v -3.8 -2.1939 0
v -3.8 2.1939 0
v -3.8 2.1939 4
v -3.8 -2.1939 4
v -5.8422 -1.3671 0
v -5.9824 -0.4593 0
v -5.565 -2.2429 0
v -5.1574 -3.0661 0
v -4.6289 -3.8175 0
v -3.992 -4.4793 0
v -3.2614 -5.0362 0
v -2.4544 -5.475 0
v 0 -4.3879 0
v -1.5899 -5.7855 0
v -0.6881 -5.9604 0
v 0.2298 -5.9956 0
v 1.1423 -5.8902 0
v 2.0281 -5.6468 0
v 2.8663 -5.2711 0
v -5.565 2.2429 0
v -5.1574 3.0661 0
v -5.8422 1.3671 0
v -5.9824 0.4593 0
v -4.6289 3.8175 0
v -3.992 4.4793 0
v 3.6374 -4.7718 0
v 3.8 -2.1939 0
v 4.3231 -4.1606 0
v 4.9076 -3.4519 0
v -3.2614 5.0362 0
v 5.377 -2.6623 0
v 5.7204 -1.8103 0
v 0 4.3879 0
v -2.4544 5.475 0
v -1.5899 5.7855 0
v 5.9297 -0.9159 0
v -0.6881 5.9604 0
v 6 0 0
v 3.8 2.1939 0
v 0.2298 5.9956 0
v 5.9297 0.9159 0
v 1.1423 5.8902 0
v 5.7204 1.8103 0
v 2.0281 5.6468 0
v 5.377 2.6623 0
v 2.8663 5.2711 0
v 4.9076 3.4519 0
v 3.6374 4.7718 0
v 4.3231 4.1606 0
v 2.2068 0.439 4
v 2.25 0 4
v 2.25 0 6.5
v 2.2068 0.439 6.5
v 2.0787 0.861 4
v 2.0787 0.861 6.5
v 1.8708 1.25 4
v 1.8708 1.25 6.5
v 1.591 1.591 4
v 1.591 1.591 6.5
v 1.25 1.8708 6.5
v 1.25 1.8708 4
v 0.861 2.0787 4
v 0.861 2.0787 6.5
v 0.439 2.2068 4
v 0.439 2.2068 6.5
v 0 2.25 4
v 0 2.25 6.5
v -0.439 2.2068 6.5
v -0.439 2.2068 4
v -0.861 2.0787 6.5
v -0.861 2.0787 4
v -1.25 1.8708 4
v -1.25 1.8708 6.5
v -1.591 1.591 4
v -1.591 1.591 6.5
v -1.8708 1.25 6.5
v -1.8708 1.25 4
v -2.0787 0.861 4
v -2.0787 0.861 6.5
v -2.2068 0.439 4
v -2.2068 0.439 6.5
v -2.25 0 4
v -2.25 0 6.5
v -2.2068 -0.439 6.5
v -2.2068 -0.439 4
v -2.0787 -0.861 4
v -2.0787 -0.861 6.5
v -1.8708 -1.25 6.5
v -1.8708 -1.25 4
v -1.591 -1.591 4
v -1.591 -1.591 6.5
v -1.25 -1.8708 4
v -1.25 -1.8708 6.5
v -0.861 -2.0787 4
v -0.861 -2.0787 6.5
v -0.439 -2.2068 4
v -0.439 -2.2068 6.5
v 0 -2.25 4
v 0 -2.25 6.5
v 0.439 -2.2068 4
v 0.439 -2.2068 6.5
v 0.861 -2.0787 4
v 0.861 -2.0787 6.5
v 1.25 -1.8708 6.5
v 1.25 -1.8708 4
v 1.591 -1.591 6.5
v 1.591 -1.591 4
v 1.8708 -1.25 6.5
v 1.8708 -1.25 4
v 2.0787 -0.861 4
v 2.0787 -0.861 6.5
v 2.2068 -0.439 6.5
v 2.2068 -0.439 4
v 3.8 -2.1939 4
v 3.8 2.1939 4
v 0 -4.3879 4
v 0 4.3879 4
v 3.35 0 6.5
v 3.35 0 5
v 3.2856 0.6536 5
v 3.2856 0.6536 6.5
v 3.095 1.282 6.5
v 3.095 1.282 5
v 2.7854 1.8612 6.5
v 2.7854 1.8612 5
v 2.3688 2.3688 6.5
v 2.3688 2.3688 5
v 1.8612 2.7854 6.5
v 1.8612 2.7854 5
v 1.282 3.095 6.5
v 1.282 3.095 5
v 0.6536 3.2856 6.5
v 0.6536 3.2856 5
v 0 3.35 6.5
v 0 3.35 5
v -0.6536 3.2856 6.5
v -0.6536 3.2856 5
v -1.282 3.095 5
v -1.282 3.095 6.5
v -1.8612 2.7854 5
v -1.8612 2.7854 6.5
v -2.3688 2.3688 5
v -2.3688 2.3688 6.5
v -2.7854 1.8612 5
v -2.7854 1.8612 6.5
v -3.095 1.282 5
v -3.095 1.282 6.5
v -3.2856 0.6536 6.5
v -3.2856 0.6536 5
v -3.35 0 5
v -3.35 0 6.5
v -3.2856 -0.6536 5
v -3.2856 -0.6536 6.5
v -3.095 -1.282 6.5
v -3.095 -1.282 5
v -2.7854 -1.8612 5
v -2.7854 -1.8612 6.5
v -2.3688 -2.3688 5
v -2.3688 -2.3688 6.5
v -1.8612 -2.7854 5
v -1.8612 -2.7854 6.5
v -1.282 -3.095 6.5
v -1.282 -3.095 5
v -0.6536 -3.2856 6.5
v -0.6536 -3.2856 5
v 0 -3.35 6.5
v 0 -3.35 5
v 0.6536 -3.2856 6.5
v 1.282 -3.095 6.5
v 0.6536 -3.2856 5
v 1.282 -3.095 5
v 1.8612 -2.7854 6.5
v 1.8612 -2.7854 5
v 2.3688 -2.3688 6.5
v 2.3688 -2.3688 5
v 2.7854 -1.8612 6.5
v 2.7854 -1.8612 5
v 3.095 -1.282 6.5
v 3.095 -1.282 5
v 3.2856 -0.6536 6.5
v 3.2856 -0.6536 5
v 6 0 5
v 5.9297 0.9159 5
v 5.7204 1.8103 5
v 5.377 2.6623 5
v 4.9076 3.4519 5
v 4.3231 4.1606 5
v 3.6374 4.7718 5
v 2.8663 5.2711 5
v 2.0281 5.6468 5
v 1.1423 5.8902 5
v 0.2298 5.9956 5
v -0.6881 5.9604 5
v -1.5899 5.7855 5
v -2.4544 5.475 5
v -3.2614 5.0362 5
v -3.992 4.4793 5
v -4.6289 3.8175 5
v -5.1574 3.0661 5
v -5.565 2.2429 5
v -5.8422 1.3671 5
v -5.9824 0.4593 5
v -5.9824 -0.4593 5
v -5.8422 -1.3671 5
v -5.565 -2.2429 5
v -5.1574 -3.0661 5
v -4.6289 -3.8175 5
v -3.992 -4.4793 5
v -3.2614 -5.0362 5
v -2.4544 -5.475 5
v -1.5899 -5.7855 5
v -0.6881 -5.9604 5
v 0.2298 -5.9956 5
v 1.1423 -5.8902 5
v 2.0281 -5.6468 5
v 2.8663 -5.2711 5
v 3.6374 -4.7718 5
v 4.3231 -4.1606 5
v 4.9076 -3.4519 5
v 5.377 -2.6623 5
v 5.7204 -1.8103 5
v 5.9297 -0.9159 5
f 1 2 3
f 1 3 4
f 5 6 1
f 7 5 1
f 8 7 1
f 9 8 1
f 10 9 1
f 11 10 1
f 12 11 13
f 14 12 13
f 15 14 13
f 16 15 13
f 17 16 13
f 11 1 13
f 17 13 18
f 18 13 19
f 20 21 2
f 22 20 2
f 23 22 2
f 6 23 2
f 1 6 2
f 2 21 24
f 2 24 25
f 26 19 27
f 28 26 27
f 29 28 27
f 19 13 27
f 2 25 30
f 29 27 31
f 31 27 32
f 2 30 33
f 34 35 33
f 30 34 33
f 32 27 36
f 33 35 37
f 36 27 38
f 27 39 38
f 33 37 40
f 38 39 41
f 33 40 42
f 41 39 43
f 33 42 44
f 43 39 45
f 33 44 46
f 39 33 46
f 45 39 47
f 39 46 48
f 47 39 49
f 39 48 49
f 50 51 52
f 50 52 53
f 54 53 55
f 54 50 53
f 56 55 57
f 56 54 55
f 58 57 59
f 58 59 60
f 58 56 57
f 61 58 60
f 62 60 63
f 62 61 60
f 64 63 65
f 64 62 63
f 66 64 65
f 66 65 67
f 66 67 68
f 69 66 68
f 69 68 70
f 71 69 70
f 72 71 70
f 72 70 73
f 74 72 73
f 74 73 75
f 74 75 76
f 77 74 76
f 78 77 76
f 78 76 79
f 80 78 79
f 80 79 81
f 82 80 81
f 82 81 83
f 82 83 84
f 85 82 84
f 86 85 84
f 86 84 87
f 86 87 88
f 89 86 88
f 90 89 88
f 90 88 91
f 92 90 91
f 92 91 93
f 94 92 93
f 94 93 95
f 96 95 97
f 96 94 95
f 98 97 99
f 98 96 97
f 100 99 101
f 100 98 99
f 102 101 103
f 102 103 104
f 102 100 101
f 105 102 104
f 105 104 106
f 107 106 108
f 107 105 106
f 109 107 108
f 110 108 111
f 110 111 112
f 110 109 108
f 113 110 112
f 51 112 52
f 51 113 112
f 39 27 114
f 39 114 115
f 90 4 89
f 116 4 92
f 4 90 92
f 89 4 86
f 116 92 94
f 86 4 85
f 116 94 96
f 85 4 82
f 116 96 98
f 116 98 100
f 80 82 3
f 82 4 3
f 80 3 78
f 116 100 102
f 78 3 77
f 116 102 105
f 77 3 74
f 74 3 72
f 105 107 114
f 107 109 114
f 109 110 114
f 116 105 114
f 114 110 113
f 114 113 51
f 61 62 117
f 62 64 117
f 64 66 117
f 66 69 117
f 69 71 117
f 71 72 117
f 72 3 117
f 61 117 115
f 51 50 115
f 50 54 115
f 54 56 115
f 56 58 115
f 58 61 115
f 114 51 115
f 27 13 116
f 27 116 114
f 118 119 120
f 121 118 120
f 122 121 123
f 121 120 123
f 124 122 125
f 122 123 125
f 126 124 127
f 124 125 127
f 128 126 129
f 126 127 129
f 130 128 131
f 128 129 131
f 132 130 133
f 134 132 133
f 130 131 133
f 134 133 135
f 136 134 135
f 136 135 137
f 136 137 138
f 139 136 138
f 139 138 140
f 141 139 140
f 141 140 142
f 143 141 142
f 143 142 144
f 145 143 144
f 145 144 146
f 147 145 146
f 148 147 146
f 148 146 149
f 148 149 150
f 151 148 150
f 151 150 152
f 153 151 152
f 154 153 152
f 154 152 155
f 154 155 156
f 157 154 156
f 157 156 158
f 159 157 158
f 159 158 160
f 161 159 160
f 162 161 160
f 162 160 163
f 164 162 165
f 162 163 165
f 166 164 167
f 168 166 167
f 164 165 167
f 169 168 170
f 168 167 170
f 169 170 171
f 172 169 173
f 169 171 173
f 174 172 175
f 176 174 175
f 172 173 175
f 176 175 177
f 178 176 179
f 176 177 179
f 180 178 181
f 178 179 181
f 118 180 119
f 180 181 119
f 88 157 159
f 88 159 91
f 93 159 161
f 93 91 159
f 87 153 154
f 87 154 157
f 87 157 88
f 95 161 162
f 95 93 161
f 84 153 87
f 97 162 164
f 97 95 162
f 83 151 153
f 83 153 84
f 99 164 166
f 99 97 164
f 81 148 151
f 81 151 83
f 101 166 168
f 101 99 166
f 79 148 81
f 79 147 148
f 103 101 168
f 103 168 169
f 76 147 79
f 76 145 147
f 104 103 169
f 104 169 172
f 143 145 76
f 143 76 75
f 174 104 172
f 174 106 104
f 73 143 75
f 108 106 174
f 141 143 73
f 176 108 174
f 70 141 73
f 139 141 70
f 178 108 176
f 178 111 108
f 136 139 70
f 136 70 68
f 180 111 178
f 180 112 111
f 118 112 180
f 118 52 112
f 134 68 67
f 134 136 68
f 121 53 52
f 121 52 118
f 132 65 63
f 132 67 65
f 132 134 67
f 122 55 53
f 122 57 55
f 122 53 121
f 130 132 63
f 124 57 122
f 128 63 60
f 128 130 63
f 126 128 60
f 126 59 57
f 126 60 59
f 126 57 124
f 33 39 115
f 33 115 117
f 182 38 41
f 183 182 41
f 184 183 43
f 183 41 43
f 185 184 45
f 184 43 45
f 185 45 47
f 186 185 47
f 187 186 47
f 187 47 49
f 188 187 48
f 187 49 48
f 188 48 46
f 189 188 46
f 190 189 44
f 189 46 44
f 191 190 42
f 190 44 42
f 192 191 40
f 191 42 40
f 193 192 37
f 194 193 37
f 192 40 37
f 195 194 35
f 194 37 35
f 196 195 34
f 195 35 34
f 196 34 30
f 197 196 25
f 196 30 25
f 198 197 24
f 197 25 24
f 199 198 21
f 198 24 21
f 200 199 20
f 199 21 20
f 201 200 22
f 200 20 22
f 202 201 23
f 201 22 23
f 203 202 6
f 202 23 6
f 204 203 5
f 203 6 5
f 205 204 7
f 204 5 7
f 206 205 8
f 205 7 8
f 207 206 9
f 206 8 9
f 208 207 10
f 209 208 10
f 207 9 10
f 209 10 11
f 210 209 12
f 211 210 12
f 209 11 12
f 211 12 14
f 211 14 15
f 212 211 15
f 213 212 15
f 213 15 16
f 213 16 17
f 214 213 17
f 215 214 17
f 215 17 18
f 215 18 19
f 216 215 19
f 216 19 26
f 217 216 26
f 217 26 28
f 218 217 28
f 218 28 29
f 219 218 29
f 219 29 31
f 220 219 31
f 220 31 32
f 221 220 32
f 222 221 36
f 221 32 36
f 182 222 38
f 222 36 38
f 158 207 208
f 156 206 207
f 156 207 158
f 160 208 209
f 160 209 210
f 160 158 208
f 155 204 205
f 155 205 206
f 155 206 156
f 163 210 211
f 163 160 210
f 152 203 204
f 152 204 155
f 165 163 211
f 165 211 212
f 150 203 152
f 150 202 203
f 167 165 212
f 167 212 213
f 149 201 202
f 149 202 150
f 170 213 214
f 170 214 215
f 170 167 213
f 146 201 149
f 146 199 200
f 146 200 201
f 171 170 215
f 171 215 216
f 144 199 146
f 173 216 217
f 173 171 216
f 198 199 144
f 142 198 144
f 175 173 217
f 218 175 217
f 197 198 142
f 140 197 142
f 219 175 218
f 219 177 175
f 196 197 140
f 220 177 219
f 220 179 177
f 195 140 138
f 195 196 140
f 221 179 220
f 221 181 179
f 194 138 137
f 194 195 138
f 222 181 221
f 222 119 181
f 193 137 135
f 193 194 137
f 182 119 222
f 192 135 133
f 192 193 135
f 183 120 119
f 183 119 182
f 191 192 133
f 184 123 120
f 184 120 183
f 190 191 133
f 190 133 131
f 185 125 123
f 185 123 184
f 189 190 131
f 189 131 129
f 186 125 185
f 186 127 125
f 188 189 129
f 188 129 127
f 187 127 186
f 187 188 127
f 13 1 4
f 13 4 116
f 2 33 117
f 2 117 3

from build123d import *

# Parameters (mm, degrees)
F0_R     = 3.35
F0_R_2   = 2.25
F1_DEPTH = 6.5
F0_R_3   = 6
F2_DEPTH = 5
F3_R     = 3.35
F4_DEPTH = 4


with BuildPart() as f1:
    # F0 (on Top) → F1 (new body)
    with BuildSketch(Plane.XY):
        Circle(F0_R)
        Circle(F0_R_2, mode=Mode.SUBTRACT)
    extrude(amount=F1_DEPTH)

    # F0 (on Top) → F2 (join)
    with BuildSketch(Plane.XY):
        Circle(F0_R_3)
        Circle(F0_R, mode=Mode.SUBTRACT)
    extrude(amount=F2_DEPTH)

    # F3 (on face) + F0 (on Top) → F4 (cut)
    with BuildSketch(Plane.XY):
        Polygon((3.8, 2.193931), (0, 4.387862), (-3.8, 2.193931), (-3.8, -2.193931), (0, -4.387862), (3.8, -2.193931), align=None)
        Circle(F3_R, mode=Mode.SUBTRACT)
    with BuildSketch(Plane.XY):
        Circle(F0_R)
        Circle(F0_R_2, mode=Mode.SUBTRACT)
    extrude(amount=F4_DEPTH, mode=Mode.SUBTRACT)


solid = f1.part
